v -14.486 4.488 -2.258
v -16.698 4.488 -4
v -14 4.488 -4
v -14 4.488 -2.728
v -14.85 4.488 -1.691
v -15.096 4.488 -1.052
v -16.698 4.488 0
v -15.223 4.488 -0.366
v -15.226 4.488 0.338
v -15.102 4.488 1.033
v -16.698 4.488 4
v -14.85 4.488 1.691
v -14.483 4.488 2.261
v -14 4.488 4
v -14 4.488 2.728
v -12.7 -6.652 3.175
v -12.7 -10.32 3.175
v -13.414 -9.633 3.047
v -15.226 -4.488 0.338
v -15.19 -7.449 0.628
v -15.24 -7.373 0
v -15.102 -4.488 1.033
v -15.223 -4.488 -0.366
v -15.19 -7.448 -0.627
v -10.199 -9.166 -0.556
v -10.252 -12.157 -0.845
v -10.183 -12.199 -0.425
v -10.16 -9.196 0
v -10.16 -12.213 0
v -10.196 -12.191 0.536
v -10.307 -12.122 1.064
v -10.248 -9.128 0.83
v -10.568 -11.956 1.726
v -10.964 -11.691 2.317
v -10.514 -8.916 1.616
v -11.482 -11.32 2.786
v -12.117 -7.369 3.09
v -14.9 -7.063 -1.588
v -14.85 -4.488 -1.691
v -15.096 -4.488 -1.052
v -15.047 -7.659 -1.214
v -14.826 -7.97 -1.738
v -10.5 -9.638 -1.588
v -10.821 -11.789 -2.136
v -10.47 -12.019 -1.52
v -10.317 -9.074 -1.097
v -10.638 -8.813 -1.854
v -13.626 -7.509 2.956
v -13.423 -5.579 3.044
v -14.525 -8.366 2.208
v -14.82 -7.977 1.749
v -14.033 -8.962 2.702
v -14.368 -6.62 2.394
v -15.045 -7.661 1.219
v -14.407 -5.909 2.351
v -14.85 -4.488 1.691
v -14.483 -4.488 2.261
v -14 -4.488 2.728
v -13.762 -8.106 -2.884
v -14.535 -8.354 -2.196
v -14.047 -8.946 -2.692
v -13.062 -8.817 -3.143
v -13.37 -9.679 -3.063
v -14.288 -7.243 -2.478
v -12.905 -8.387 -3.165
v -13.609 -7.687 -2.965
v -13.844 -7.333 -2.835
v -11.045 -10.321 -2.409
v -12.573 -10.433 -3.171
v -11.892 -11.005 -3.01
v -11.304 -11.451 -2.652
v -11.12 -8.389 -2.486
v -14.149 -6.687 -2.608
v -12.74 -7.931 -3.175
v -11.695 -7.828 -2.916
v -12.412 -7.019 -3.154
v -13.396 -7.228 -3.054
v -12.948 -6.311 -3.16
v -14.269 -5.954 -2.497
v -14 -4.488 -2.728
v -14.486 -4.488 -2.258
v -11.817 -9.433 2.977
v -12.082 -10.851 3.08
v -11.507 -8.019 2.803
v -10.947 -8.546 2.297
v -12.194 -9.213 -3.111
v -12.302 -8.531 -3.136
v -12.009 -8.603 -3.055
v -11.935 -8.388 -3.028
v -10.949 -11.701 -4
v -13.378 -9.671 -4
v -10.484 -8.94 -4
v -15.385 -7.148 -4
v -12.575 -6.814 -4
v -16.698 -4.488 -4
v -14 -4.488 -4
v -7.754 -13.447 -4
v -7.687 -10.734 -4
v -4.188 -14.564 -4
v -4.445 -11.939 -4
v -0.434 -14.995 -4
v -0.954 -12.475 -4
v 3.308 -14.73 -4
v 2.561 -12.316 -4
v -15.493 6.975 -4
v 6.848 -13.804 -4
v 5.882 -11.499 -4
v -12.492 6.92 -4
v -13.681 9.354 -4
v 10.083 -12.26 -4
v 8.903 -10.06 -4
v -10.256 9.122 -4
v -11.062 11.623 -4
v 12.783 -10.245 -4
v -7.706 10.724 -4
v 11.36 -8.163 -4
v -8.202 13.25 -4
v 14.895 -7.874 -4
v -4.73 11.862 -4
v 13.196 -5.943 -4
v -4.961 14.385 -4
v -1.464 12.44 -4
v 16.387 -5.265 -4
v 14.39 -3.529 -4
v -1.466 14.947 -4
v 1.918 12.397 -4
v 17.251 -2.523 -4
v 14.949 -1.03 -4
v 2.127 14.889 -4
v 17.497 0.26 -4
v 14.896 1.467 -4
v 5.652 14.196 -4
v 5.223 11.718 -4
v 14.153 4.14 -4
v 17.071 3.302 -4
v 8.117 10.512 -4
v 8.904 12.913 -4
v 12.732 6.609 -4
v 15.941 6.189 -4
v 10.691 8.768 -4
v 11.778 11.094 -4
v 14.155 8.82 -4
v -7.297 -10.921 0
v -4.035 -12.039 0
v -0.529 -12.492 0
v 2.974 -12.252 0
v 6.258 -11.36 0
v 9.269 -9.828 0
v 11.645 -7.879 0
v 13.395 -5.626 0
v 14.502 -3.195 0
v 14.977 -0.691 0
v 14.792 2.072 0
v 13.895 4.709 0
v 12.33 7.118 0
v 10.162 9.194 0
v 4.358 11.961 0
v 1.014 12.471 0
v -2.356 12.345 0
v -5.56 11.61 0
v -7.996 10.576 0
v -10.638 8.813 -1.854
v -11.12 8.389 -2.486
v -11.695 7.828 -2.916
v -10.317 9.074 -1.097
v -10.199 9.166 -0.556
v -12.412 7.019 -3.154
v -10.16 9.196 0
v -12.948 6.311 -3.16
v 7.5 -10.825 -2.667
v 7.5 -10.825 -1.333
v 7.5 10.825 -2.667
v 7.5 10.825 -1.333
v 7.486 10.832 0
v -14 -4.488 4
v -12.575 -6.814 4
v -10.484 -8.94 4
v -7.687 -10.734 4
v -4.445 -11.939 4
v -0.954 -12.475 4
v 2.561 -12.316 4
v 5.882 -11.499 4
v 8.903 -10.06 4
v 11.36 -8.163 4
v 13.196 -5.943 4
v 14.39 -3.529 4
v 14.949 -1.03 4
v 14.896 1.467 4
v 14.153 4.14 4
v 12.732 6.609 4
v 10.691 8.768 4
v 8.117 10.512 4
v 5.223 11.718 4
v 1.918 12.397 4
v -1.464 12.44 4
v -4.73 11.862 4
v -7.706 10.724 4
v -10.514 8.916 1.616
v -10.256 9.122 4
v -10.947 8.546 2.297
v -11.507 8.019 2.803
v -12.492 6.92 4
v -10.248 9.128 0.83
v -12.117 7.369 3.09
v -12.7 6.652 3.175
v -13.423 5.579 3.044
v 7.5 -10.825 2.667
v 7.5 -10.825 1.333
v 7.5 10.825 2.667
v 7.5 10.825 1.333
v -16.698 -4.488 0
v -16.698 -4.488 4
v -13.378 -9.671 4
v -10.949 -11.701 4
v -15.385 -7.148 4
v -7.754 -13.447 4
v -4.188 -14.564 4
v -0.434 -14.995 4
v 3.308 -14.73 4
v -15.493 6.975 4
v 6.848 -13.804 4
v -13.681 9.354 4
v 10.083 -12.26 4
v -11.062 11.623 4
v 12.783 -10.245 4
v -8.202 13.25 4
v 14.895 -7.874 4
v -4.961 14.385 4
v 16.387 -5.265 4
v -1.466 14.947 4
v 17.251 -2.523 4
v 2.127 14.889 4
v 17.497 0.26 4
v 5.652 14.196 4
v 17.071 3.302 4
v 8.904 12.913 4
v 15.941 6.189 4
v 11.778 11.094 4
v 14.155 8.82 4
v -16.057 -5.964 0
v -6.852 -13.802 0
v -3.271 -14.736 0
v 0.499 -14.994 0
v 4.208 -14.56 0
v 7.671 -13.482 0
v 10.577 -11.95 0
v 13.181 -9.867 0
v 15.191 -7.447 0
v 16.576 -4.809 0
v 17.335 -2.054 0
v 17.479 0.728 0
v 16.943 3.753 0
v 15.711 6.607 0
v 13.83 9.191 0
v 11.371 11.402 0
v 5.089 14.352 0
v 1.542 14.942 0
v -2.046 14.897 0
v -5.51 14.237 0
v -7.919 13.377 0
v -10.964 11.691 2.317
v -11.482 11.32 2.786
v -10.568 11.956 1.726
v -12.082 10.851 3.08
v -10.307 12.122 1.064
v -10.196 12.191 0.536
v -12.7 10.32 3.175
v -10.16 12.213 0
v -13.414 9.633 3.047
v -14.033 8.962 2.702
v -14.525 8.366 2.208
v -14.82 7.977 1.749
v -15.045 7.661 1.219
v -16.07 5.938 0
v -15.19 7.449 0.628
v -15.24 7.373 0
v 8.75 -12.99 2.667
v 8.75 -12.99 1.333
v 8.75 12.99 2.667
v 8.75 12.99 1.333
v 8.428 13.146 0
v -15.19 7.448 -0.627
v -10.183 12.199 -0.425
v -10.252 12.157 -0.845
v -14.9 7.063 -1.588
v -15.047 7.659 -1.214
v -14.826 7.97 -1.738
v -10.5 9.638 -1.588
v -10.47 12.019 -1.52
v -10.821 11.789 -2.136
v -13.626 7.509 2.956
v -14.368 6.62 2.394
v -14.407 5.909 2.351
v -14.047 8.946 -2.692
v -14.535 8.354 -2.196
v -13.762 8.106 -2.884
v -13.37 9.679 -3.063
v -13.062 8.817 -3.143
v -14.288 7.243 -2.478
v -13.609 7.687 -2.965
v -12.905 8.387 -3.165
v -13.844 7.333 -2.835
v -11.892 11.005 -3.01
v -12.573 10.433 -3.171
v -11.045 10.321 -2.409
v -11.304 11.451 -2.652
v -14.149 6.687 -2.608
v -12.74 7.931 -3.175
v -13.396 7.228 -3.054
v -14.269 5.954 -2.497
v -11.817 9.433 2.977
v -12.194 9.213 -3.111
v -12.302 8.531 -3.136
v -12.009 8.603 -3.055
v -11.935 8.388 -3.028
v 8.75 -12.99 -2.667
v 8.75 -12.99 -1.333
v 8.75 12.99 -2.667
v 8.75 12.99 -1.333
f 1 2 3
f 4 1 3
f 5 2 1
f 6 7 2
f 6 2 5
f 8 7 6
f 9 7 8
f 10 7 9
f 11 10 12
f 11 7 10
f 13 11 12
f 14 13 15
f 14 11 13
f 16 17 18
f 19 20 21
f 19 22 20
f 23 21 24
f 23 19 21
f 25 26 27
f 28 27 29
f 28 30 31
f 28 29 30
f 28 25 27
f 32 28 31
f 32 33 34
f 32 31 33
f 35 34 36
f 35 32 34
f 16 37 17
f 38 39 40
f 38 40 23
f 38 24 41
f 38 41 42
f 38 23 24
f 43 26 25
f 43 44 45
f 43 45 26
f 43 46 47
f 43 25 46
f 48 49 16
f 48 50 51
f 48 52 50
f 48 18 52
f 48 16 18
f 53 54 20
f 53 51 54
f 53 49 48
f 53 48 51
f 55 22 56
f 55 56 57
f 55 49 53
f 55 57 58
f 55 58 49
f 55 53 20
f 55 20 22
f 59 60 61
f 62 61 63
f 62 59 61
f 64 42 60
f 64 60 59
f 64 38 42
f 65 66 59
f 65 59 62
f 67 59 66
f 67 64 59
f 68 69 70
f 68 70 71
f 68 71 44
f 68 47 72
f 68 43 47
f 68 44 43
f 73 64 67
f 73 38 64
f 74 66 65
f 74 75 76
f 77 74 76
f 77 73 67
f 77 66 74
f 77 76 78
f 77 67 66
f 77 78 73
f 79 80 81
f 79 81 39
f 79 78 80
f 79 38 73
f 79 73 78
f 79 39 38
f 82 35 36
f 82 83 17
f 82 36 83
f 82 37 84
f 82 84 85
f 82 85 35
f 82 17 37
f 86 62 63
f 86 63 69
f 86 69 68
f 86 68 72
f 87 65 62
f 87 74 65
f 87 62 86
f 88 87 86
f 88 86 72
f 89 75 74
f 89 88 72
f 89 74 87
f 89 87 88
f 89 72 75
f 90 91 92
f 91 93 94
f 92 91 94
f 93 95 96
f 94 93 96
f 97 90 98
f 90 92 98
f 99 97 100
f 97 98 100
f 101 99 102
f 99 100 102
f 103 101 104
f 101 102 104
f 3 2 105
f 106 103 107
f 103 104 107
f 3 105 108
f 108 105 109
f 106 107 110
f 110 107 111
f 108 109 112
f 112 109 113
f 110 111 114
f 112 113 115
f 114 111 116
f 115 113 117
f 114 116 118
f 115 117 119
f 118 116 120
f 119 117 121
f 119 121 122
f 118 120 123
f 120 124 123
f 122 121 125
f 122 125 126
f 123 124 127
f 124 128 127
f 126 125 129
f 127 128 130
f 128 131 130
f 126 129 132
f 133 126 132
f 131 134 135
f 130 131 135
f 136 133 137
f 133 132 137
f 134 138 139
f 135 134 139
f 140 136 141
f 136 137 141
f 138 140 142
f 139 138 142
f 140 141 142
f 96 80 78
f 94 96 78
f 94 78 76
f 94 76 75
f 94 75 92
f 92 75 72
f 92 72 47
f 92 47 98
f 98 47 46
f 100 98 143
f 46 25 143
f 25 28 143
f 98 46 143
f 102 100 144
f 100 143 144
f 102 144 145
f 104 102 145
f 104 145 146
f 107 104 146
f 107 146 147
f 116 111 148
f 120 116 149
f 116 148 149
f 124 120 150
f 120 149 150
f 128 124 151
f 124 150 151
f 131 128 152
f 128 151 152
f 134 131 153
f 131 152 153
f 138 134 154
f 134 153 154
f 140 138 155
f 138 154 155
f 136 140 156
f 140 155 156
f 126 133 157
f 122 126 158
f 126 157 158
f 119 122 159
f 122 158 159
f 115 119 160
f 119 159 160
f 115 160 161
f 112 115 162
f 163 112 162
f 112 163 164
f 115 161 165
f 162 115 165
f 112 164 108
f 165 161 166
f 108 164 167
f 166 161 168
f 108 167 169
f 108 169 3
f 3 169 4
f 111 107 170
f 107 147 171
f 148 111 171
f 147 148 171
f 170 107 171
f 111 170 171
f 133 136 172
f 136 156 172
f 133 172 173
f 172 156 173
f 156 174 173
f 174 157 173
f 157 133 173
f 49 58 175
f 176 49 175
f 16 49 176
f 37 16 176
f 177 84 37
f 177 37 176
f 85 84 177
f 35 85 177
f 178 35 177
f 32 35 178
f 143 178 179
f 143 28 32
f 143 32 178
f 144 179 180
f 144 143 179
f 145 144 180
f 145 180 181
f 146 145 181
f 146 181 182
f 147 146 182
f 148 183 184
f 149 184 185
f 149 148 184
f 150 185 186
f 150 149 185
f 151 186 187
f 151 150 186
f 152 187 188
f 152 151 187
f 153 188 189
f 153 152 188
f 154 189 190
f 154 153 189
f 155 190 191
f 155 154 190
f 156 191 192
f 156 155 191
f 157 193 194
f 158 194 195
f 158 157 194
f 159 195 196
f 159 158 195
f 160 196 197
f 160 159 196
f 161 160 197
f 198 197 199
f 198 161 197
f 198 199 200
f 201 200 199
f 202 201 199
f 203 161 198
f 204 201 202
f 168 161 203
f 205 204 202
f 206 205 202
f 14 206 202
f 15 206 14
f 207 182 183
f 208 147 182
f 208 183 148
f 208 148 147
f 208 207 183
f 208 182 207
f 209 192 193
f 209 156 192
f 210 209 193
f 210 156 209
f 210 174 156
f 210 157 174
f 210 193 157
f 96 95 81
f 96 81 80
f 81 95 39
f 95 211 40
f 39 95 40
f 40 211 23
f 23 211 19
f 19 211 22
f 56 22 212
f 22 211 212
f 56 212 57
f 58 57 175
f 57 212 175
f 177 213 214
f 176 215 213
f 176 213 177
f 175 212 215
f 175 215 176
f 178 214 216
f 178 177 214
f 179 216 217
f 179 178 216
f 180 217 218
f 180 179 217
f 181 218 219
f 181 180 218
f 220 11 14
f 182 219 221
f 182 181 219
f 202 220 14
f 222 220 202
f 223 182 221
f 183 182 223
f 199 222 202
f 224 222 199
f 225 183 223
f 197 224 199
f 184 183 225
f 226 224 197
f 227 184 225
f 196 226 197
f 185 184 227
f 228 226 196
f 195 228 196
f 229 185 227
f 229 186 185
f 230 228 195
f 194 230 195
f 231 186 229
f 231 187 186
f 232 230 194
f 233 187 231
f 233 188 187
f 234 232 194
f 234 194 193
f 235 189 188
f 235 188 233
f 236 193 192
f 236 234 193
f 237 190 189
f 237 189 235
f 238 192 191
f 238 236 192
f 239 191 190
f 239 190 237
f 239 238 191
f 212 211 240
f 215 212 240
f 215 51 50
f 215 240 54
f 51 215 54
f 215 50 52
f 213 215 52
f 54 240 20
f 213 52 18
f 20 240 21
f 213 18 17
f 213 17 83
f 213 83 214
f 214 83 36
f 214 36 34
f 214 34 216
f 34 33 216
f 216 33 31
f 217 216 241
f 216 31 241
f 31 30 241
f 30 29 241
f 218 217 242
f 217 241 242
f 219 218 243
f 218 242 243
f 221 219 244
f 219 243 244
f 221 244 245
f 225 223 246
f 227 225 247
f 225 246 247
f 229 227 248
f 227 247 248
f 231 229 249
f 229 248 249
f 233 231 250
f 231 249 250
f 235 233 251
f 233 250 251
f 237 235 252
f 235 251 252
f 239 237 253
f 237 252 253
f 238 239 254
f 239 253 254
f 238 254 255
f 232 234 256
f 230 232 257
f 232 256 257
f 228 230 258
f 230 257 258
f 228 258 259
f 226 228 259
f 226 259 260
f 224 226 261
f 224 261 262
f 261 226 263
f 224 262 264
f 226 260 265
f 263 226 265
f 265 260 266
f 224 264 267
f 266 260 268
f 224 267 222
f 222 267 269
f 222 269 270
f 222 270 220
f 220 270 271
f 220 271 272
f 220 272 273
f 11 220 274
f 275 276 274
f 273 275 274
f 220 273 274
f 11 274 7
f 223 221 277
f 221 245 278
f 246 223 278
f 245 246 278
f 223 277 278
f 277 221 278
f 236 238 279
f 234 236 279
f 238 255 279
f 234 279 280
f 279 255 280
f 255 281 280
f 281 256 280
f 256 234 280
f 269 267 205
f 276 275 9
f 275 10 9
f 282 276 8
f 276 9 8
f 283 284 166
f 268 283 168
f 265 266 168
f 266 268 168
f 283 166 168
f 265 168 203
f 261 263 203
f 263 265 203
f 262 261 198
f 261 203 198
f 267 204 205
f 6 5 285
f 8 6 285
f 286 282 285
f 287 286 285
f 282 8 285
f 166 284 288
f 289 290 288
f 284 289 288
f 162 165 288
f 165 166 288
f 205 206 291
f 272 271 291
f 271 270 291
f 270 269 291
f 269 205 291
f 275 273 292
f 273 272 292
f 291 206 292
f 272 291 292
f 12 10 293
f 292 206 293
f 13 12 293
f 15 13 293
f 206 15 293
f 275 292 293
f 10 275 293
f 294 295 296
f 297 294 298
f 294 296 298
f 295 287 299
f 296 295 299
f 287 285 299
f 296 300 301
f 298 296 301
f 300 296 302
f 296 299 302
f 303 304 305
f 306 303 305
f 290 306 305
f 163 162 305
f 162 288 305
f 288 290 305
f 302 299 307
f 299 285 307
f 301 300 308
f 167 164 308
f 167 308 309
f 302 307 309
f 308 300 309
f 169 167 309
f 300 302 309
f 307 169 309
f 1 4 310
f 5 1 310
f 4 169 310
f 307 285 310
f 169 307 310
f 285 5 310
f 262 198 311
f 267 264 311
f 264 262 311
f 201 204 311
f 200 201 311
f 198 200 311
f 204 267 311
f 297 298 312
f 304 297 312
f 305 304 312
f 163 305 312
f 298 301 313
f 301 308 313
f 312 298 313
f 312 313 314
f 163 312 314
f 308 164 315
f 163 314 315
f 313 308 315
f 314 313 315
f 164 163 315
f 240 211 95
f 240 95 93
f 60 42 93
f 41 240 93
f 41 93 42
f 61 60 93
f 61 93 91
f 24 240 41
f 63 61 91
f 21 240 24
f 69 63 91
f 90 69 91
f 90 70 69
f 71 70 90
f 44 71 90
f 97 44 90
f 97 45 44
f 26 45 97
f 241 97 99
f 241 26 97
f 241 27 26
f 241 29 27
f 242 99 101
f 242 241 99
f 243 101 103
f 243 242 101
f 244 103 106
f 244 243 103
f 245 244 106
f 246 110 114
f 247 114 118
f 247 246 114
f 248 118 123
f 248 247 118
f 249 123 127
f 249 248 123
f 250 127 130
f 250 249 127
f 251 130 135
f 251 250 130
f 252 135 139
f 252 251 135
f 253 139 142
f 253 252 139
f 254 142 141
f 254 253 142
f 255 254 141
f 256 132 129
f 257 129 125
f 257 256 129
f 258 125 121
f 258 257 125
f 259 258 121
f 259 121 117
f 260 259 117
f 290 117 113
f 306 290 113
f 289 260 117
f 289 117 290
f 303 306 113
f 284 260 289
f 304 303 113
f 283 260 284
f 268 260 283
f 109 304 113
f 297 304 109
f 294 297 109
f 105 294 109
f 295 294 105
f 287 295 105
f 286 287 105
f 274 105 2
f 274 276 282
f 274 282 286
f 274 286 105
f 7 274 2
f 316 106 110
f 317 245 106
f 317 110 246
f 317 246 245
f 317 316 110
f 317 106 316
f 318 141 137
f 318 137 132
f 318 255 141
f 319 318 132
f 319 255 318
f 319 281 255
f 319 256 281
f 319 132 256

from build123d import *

# Parameters (mm, degrees)
F2_DEPTH = 4
F3_W     = 11.2592019141
F3_H     = 8.9759733528
F4_DEPTH = 12.7
F6_DEPTH = 12.7


with BuildPart() as f2:
    # F0 (on Top) → F2 (new body, symmetric)
    with BuildSketch(Plane.XY):
        with BuildLine():
            add(Edge.make_bspline(
                [(-17.5, 0), (-17.5, -25.9807621135), (8.75, -12.9903810568), (35, 0), (8.75, 12.9903810568), (-17.5, 25.9807621135), (-17.5, 0)],
                knots=[0, 0, 0, 2.0943951024, 2.0943951024, 4.1887902048, 4.1887902048, 6.2831853072, 6.2831853072, 6.2831853072], degree=2, weights=[1, 0.5, 1, 0.5, 1, 0.5, 1]))
        make_face()
        with BuildLine():
            add(Edge.make_bspline(
                [(-15, 0), (-15, -21.6506350946), (7.5, -10.8253175473), (30, 0), (7.5, 10.8253175473), (-15, 21.6506350946), (-15, 0)],
                knots=[0, 0, 0, 2.0943951024, 2.0943951024, 4.1887902048, 4.1887902048, 6.2831853072, 6.2831853072, 6.2831853072], degree=2, weights=[1, 0.5, 1, 0.5, 1, 0.5, 1]))
        make_face(mode=Mode.SUBTRACT)
    extrude(amount=F2_DEPTH, both=True)

    # F3 (on Top) → F4 (cut, symmetric)
    with BuildSketch(Plane.XY):
        with Locations((-15.3908506036, 0)):
            Rectangle(F3_W, F3_H)
    extrude(amount=F4_DEPTH, both=True, mode=Mode.SUBTRACT)

    # F5 (on Front) → F6 (cut, symmetric)
    with BuildSketch(Plane.XZ):
        with BuildLine():
            add(Edge.make_bspline(
                [(-12.7, 3.175), (-17.0994090512, 3.175), (-14.8997045256, -1.5875), (-12.7, -6.35), (-10.5002954744, -1.5875), (-8.3005909488, 3.175), (-12.7, 3.175)],
                knots=[0, 0, 0, 2.0943951024, 2.0943951024, 4.1887902048, 4.1887902048, 6.2831853072, 6.2831853072, 6.2831853072], degree=2, weights=[1, 0.5, 1, 0.5, 1, 0.5, 1]))
        make_face()
    extrude(amount=F6_DEPTH, both=True, mode=Mode.SUBTRACT)


solid = f2.part
